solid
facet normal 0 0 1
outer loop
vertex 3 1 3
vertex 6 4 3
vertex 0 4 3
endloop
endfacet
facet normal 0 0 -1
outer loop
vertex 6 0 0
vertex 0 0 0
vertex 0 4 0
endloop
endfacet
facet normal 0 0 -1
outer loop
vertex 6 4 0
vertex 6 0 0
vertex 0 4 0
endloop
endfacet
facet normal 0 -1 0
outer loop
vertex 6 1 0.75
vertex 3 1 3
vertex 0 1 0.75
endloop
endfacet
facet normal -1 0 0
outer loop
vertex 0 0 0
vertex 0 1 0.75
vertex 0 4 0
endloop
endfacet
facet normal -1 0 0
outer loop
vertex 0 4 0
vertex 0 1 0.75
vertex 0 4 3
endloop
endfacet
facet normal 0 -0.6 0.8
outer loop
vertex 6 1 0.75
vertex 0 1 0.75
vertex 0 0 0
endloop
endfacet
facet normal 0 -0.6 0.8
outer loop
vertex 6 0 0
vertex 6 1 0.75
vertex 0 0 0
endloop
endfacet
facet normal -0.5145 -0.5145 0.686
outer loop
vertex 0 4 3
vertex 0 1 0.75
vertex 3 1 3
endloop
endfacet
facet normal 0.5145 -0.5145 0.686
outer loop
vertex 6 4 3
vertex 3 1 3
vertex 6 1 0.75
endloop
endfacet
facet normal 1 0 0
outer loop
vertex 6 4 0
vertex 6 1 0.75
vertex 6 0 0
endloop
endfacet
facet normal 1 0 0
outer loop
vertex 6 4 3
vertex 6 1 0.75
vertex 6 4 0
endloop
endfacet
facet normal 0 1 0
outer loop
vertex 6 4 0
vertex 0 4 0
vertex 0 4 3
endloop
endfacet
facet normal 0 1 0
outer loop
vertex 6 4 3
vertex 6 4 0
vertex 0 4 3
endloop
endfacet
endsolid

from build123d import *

# Parameters (mm, degrees)
F1_DEPTH  = 6
F3_DEPTH  = 6
F8_DEPTH  = 25
F11_DEPTH = 25


with BuildPart() as f1:
    # F0 (on Right) → F1 (new body)
    with BuildSketch(Plane.YZ):
        Polygon((4, 3), (0, 0), (4, 0), align=None)
    extrude(amount=F1_DEPTH)

    # F2 (on face) → F3 (join)
    with BuildSketch(Plane.YZ.offset(6)):
        Polygon((1, 0.75), (4, 3), (1, 3), align=None)
    extrude(amount=-F3_DEPTH)

    # F7 (on 3pt) → F8 (cut)
    with BuildSketch(Plane(origin=(1.5882352941, -1.5882352941, 2.1176470588), x_dir=(0.8574929257, 0.3086974533, -0.4115966043), z_dir=(0.5144957554, -0.5144957554, 0.6859943406))):
        Polygon((5.1449575543, 1.25), (5.1449575543, 5), (1.6463864174, 2.6), align=None)
    extrude(amount=F8_DEPTH, mode=Mode.SUBTRACT)

    # F10 (on 3pt) → F11 (cut)
    with BuildSketch(Plane(origin=(0, 0, 0), x_dir=(0.8574929257, -0.3086974533, 0.4115966043), z_dir=(0.5144957554, 0.5144957554, -0.6859943406))):
        Polygon((0, -1.25), (0, -5), (3.4985711369, -2.6), align=None)
    extrude(amount=-F11_DEPTH, mode=Mode.SUBTRACT)


solid = f1.part
